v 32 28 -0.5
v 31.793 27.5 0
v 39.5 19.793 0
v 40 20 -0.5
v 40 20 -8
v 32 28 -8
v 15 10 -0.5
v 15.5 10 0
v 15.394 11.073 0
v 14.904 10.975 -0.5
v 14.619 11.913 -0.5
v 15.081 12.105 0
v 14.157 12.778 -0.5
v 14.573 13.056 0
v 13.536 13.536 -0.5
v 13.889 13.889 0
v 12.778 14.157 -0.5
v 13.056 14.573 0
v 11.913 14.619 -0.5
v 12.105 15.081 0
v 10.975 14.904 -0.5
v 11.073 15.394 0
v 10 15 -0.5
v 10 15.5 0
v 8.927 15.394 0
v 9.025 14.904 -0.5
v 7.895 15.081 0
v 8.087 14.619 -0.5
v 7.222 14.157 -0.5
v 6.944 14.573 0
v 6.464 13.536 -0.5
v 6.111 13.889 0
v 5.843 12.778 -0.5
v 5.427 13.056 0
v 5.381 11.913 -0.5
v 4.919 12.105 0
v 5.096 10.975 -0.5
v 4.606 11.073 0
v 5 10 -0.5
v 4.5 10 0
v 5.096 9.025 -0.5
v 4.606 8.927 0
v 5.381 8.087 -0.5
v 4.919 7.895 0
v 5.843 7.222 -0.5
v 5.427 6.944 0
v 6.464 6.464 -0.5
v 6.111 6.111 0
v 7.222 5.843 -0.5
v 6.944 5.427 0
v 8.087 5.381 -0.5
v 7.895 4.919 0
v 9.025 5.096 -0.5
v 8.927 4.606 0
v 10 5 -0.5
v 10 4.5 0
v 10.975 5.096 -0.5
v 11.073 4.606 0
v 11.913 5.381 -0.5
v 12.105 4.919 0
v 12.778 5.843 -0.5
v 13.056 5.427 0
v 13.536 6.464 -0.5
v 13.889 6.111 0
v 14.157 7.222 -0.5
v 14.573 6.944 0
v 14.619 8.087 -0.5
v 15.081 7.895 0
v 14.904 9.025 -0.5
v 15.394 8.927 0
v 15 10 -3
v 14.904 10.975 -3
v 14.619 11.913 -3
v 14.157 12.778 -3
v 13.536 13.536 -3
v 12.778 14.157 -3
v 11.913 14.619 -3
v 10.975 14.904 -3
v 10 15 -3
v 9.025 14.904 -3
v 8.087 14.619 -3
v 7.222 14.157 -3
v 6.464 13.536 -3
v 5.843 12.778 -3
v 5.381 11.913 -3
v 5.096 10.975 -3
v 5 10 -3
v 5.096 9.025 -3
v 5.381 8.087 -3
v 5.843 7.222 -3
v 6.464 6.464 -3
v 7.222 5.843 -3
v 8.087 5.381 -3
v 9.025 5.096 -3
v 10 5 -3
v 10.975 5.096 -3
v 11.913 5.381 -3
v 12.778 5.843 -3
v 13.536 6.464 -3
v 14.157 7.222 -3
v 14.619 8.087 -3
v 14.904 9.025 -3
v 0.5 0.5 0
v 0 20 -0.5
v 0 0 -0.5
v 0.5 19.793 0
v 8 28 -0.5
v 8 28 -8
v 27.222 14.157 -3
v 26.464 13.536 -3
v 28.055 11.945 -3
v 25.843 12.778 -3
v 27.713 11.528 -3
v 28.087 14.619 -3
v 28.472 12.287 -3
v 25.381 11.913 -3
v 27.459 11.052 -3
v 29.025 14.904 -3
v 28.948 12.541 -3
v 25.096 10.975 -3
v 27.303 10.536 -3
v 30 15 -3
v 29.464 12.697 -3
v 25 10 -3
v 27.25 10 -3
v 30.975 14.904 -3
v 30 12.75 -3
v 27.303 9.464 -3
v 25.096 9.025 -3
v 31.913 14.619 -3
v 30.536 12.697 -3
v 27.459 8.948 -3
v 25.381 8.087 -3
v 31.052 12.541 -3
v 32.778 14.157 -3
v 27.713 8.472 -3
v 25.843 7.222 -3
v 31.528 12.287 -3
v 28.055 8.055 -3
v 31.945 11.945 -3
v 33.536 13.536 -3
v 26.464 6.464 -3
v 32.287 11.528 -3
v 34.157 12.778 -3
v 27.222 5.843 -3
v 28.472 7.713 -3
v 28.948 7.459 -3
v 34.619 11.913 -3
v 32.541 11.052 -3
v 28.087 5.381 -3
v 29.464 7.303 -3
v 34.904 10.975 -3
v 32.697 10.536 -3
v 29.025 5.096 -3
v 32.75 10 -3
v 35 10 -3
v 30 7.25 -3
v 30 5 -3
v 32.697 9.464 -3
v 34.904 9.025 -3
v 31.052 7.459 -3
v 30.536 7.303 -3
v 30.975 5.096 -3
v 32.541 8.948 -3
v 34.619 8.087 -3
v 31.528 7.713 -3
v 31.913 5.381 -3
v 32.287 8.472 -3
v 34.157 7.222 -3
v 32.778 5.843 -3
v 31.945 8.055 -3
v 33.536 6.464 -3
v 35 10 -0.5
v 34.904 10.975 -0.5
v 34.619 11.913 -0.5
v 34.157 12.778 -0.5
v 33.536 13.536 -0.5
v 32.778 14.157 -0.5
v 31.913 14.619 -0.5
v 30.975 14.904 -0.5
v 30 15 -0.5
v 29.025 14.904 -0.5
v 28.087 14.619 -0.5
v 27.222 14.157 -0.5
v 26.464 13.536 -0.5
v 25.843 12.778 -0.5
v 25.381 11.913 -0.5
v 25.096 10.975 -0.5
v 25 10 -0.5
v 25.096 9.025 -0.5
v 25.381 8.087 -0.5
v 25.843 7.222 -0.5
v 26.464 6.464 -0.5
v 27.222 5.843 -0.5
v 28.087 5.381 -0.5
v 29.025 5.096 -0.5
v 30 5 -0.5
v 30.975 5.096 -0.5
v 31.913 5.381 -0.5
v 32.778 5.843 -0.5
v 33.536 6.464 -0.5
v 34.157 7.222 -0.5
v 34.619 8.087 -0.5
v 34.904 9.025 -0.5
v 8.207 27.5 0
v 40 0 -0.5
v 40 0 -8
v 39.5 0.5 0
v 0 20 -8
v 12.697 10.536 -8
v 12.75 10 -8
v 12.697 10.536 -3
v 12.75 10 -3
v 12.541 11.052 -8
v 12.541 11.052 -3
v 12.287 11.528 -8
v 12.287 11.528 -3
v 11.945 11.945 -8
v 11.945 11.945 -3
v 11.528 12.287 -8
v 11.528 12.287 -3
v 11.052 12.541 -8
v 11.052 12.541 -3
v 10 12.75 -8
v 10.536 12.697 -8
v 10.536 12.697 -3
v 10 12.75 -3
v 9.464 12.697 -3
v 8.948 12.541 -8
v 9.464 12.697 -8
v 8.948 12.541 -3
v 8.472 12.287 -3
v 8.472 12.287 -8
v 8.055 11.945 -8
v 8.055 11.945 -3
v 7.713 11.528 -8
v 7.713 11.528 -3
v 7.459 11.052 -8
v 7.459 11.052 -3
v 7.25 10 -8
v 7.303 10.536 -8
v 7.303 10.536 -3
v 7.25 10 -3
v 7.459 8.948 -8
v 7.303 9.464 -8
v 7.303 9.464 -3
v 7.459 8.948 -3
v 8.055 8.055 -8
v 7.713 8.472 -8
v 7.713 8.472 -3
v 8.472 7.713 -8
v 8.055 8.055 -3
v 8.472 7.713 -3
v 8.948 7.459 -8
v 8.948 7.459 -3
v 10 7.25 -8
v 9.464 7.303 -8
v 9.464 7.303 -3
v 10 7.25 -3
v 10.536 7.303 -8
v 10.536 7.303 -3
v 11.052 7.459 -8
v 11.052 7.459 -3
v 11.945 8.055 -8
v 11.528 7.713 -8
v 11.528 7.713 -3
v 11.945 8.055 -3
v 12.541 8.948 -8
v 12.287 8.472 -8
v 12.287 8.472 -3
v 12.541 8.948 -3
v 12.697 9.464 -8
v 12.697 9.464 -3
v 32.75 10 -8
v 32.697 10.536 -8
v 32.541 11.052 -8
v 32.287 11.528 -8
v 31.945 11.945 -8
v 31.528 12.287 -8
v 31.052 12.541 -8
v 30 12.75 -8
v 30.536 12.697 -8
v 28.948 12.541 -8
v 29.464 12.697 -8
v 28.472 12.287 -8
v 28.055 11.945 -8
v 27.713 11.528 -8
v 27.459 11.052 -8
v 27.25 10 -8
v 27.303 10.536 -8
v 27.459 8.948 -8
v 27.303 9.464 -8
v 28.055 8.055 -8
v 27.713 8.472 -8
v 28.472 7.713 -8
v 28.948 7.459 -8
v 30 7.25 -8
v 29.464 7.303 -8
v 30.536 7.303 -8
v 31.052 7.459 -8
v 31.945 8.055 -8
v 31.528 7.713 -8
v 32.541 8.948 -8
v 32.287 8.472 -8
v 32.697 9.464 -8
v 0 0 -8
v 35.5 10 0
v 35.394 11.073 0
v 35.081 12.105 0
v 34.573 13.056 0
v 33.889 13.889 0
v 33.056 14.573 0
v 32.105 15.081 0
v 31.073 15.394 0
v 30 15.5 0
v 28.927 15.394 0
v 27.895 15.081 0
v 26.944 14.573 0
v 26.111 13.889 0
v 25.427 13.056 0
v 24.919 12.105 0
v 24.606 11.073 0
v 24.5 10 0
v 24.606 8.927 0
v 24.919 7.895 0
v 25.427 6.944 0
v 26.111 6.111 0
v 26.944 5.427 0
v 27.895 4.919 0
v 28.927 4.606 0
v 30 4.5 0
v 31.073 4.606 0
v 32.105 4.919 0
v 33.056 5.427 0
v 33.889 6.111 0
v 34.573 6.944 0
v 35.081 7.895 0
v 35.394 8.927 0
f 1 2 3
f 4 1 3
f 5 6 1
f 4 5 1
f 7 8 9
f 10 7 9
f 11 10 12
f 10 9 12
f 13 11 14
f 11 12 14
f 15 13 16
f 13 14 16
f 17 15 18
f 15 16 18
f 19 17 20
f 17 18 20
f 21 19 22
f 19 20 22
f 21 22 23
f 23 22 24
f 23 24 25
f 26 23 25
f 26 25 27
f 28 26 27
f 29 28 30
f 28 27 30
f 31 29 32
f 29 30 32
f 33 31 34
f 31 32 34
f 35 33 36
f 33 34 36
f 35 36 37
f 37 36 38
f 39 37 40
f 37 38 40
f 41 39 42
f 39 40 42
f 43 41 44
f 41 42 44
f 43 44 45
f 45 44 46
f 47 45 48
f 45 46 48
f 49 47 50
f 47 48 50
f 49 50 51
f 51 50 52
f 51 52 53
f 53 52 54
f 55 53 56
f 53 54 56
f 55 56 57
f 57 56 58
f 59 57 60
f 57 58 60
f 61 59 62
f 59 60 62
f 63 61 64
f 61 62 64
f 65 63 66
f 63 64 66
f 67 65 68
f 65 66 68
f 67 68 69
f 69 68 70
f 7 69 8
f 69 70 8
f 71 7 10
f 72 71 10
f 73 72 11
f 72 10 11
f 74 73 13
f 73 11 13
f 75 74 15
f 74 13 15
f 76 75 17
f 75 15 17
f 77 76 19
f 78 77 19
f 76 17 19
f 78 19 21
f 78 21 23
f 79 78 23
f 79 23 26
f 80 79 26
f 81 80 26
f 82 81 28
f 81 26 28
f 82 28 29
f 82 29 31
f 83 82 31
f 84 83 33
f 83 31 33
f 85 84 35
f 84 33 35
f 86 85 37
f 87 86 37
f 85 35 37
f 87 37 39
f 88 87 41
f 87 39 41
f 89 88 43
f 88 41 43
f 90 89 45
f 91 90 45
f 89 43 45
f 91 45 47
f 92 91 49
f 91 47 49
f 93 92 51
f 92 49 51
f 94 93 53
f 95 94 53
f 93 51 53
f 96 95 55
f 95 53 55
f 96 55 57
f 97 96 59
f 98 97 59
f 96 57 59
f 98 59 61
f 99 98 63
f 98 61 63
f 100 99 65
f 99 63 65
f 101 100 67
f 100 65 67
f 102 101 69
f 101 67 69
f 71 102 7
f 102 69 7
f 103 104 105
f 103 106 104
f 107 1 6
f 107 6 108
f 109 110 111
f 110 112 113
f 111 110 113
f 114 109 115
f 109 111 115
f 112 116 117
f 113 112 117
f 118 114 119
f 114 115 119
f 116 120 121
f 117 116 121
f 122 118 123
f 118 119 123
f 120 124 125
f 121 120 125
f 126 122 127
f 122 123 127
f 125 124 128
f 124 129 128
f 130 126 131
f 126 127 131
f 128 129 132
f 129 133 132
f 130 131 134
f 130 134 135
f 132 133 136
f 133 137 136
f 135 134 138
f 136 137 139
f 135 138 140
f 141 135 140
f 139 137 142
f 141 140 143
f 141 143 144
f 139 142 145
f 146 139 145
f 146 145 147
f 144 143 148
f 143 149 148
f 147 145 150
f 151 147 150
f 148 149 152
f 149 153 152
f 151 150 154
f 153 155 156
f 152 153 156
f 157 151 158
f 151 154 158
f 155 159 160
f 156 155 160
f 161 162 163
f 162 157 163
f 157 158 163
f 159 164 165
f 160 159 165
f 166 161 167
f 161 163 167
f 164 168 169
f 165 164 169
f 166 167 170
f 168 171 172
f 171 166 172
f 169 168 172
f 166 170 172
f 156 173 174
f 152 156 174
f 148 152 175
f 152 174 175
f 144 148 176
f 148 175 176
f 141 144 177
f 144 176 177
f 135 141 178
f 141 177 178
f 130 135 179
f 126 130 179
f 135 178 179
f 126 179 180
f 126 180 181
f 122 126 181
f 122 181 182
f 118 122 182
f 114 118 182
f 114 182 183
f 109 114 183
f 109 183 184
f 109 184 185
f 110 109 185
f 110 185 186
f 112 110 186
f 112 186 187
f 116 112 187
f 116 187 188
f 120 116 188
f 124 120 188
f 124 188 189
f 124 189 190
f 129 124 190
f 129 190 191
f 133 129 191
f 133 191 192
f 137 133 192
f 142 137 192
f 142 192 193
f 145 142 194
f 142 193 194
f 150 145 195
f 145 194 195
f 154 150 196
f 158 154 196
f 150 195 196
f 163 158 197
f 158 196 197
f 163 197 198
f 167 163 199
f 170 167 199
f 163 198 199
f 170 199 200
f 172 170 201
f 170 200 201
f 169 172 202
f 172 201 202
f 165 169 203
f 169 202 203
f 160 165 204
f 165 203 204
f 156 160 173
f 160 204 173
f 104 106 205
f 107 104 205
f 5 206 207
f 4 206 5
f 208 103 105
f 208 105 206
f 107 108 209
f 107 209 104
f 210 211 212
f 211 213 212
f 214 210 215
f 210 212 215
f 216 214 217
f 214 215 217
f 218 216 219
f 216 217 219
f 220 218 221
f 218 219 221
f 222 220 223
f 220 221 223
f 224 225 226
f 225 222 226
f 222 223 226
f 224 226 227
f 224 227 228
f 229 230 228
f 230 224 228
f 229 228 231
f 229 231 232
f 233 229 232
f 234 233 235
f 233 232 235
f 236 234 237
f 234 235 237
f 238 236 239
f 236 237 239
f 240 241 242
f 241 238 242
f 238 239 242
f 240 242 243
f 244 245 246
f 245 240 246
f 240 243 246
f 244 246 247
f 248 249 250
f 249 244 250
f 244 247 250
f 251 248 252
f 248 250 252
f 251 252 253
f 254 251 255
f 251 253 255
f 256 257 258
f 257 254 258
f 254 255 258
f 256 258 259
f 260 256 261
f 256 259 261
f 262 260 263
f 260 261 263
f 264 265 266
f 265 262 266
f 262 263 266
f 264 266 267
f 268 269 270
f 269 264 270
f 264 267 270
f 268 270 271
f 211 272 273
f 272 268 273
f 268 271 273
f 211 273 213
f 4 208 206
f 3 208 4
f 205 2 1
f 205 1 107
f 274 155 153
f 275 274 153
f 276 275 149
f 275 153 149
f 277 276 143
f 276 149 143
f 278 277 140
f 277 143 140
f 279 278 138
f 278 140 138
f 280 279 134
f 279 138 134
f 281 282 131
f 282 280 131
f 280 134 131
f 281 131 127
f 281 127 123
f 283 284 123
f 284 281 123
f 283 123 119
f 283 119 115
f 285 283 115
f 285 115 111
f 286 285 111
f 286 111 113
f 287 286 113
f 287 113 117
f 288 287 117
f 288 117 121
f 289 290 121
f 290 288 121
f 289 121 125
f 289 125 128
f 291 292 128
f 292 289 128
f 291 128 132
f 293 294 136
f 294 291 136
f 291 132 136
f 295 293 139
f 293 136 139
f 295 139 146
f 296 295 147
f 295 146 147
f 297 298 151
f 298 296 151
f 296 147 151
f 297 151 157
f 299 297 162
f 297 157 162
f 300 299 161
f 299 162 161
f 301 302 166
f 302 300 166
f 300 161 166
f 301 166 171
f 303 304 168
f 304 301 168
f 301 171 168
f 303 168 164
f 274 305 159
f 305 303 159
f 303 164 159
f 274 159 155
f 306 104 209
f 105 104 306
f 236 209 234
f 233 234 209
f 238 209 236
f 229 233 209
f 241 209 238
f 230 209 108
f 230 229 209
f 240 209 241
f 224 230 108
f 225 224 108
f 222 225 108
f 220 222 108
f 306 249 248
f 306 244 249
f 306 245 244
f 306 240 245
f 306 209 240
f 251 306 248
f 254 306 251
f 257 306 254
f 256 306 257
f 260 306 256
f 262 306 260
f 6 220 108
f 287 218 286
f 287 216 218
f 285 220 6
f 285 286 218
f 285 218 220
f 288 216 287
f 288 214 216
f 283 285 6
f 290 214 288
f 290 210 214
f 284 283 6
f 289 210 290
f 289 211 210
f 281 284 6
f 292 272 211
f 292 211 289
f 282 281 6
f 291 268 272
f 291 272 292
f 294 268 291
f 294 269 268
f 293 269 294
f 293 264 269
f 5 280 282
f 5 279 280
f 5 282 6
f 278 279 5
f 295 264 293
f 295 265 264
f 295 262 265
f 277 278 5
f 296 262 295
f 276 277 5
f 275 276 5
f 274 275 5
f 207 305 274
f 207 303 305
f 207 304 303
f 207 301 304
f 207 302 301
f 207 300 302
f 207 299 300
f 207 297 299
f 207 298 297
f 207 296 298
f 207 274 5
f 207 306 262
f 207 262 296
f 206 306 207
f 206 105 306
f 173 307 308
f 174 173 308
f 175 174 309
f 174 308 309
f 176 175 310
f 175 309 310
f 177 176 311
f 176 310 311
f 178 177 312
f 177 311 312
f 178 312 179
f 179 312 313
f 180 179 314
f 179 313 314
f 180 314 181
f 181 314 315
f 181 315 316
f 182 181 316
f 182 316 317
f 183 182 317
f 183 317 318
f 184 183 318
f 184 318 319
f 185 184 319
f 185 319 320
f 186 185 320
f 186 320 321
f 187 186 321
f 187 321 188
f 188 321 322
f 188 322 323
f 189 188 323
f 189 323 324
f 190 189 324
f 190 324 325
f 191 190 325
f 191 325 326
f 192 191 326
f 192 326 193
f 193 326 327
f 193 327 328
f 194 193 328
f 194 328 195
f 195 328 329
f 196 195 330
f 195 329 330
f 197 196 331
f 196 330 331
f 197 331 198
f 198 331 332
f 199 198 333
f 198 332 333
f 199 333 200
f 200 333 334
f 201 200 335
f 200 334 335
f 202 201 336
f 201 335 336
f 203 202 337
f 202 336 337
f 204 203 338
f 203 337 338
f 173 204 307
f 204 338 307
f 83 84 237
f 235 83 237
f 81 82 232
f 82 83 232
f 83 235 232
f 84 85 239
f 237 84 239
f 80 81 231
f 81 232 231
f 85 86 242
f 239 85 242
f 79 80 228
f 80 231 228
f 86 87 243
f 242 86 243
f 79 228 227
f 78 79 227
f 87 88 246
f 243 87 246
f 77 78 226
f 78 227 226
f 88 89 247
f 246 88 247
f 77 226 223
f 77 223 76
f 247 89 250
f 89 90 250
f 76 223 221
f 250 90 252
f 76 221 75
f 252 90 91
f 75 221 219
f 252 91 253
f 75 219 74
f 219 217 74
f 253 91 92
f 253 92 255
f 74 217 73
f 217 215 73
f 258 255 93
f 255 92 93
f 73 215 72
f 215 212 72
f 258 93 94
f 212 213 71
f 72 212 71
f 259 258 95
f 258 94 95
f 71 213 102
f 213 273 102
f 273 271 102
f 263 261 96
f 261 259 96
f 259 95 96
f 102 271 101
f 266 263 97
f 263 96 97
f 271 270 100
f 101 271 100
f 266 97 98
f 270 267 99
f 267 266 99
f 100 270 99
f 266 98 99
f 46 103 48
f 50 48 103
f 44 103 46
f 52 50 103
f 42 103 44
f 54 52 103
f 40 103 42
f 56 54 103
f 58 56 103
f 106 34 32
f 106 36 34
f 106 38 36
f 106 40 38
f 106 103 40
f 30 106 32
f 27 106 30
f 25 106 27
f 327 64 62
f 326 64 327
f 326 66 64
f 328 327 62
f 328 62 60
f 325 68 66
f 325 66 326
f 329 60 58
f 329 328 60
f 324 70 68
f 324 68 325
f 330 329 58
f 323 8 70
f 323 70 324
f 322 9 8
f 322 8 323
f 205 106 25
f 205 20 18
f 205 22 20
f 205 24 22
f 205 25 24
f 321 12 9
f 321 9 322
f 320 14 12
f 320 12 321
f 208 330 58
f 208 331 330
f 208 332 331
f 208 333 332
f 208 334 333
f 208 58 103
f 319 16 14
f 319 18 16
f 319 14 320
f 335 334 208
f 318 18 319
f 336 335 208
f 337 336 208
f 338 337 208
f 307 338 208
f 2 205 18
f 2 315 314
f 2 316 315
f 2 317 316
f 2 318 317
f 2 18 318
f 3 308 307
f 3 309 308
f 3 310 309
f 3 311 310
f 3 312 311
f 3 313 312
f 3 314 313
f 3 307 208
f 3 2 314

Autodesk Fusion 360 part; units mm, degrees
sketch "Sketch1" plane through (0, 0, 0) normal (0, 0, 1) x (1, 0, 0)
  line L0 (0, 0) -> (40, 0)
  line L1 (40, 0) -> (40, 28)
  line L2 (40, 28) -> (0, 28)
  line L3 (0, 28) -> (0, 0)
  line L4 (0, 0) -> (40, 0) construction
  line L5 (40, 0) -> (40, 20) construction
  line L6 (40, 20) -> (0, 20) construction
  line L7 (0, 20) -> (0, 0) construction
  line L8 (0, 20) -> (20, 20) construction
  line L9 (20, 20) -> (20, 0) construction
  line L10 (20, 0) -> (0, 0) construction
  line L11 (0, 0) -> (0, 20) construction
  line L12 (0, 0) -> (20, 20) construction
  line L13 (0, 20) -> (20, 0) construction
  line L14 (20, 20) -> (40, 0) construction
  line L15 (20, 0) -> (40, 20) construction
  circle A0 centre (10, 10) radius 5
  circle A1 centre (30, 10) radius 5
  dimension "d1" = 40
  dimension "d2" = 28
  dimension "d3" = 20
  dimension "d4" = 10
  dimension "d5" = 10
extrude "Extrude1" add sketch "Sketch1" against normal blind 3
sketch "Sketch2" plane through (0, 0, -3) normal (0, 0, -1) x (1, 0, 0)
  circle A0 centre (10, -10) radius 5
  circle A1 centre (30, -10) radius 5
  line L0 (0, 0) -> (0, -28)
  line L1 (0, -28) -> (40, -28)
  line L2 (40, -28) -> (40, 0)
  line L3 (40, 0) -> (0, 0)
  circle A2 centre (30, -10) radius 2.75
  circle A3 centre (10, -10) radius 2.75
  dimension "d8" = 5.5
  dimension "d9" = 5.5
extrude "Extrude2" add sketch "Sketch2" along normal blind 5 contours A0 | A1 | L0 L1 L2 L3
chamfer "Chamfer1" distance 8 angle 45 1 edges at (0, 28, -4)
chamfer "Chamfer2" distance 8 angle 45 1 edges at (40, 28, -4)
chamfer "Chamfer3" distance 0.5 angle 45 8 edges at (4, 24, 0) (0, 10, 0) (20, 0, 0) (40, 10, 0) (36, 24, 0) (20, 28, 0) (5.3384, 11.8081, 0) (25.3384, 11.8081, 0)
